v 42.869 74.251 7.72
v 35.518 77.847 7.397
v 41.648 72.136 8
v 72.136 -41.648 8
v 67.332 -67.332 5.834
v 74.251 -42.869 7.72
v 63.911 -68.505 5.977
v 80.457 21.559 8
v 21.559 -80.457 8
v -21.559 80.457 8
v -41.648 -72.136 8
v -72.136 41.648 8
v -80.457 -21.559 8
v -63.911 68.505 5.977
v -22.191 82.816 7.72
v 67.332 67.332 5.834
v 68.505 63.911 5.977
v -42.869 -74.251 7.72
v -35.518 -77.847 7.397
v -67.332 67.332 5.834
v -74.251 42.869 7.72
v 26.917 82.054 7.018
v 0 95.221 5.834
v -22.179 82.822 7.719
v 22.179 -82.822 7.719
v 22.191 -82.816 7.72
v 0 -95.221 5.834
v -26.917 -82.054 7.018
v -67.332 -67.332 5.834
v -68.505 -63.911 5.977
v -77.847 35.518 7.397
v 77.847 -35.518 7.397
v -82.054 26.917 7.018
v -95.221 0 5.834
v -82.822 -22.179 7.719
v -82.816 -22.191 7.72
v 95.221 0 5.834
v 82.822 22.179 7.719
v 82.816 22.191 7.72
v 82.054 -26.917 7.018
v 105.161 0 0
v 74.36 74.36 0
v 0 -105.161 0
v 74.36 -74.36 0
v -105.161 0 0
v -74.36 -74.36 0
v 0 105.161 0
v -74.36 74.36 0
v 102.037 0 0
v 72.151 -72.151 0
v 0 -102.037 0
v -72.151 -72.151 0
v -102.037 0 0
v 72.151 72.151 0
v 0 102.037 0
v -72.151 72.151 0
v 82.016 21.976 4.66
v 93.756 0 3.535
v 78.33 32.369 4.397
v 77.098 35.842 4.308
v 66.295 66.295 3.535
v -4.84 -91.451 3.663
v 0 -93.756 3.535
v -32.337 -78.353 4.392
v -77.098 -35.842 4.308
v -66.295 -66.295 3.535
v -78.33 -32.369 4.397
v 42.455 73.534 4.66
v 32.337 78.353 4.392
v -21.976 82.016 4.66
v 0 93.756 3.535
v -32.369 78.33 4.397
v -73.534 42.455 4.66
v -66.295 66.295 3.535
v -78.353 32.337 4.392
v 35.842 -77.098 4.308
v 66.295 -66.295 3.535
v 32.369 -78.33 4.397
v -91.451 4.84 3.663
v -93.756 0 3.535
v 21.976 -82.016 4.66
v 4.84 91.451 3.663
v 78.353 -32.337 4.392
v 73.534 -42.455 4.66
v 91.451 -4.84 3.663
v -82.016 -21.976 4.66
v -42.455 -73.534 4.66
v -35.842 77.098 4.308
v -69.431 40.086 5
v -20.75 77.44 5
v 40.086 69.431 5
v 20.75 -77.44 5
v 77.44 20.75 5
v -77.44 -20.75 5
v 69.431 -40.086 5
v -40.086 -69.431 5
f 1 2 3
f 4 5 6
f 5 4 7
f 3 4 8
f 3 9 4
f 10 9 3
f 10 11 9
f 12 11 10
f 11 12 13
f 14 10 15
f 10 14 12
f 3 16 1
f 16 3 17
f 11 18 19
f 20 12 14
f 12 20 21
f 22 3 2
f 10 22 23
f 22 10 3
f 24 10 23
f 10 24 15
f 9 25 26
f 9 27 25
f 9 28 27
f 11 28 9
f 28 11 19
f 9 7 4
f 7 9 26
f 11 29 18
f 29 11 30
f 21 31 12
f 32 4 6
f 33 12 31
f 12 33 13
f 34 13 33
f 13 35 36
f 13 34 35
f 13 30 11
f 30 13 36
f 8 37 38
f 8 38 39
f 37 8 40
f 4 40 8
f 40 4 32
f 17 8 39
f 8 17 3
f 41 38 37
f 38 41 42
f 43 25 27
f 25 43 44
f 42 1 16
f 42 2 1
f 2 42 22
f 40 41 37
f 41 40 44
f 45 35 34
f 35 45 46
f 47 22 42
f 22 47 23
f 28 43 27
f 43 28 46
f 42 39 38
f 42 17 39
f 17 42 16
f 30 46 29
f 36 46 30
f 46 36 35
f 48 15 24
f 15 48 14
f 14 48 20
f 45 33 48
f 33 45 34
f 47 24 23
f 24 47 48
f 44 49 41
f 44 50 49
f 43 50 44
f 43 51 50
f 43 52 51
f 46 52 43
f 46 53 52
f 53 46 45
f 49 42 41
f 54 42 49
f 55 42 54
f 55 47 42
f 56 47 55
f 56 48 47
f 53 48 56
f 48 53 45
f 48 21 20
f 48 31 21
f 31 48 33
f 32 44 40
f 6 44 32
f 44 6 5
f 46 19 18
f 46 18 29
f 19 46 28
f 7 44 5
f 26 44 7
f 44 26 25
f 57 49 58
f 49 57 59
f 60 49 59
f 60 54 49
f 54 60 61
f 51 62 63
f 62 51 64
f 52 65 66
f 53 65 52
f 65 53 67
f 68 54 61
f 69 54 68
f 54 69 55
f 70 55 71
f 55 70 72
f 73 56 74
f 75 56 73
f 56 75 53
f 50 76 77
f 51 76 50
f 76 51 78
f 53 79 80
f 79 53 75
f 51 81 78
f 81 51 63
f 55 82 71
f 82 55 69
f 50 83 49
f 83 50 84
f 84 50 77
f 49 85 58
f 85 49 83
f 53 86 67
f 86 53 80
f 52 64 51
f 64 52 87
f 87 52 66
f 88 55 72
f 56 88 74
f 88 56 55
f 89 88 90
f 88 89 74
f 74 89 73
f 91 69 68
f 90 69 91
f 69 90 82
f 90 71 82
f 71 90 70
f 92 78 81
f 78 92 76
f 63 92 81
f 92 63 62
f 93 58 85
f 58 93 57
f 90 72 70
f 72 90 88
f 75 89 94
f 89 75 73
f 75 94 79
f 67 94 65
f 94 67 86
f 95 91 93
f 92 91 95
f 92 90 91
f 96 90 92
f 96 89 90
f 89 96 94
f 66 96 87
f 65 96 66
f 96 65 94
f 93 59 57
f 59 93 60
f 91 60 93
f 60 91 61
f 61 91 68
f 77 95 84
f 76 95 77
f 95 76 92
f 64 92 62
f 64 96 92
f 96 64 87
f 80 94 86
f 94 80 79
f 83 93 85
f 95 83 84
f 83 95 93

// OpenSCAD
//How thick the object is
topThickness=3;//[1:10]
//How large the object will be at the opening, this is the radius of the circle. Due to the way this is calcuated, the less sides the less accurate the object will be. 
objectSide=98;//[5:500]
//How large the closed end of the object is. 
objectTopSide=80;//[5:500]
//How tall the object is
objectHeight=8;//[10:250]
//How many sides there are to the object, the higher the number the more circular the object is. 
fn=8;//[3:100]


module buildIt(){
    fudge = (1+1/cos(180/fn))/2;

    union(){
        difference(){
            cylinder(objectHeight + ( topThickness * 1 ),(objectSide + ( topThickness * 1 ))*fudge,(objectTopSide + ( topThickness * 1 ))*fudge,$fn=fn); //outer triangle
            cylinder(objectHeight ,(objectSide )*fudge,(objectTopSide )*fudge,$fn=fn); //inner triangle
            difference(){
                rotate(a=[0,0,60]) cylinder(objectHeight*3,((objectSide+objectSide)*3 + ( topThickness * 1 ))*fudge,(objectTopSide*3 + ( topThickness * 1 ))*fudge,$fn=fn);
                rotate(a=[0,0,60]) cylinder(objectHeight,(objectSide+(objectSide/2))*fudge,objectTopSide*fudge,$fn=fn);
            } // the cutoffs for the corners
        }
        
        difference(){
            rotate(a=[0,0,60]) cylinder(objectHeight,(objectSide+(objectSide/2)) * fudge,objectTopSide * fudge,$fn=fn);
            rotate(a=[0,0,60]) cylinder(objectHeight-topThickness,(objectSide+(objectSide/2)-topThickness)*fudge,(objectTopSide-topThickness)*fudge,$fn=fn);
            difference(){
                cylinder(objectHeight*8,objectSide*8,objectTopSide*8,$fn=fn); //outer triangle
                cylinder(objectHeight + ( topThickness * 1 ),(objectSide + ( topThickness * 1 )) *fudge,(objectTopSide + ( topThickness * 1 ))*fudge,$fn=fn);
            }

        } // the sides for the triangle and removal of extra portions
    }
}
buildIt();
